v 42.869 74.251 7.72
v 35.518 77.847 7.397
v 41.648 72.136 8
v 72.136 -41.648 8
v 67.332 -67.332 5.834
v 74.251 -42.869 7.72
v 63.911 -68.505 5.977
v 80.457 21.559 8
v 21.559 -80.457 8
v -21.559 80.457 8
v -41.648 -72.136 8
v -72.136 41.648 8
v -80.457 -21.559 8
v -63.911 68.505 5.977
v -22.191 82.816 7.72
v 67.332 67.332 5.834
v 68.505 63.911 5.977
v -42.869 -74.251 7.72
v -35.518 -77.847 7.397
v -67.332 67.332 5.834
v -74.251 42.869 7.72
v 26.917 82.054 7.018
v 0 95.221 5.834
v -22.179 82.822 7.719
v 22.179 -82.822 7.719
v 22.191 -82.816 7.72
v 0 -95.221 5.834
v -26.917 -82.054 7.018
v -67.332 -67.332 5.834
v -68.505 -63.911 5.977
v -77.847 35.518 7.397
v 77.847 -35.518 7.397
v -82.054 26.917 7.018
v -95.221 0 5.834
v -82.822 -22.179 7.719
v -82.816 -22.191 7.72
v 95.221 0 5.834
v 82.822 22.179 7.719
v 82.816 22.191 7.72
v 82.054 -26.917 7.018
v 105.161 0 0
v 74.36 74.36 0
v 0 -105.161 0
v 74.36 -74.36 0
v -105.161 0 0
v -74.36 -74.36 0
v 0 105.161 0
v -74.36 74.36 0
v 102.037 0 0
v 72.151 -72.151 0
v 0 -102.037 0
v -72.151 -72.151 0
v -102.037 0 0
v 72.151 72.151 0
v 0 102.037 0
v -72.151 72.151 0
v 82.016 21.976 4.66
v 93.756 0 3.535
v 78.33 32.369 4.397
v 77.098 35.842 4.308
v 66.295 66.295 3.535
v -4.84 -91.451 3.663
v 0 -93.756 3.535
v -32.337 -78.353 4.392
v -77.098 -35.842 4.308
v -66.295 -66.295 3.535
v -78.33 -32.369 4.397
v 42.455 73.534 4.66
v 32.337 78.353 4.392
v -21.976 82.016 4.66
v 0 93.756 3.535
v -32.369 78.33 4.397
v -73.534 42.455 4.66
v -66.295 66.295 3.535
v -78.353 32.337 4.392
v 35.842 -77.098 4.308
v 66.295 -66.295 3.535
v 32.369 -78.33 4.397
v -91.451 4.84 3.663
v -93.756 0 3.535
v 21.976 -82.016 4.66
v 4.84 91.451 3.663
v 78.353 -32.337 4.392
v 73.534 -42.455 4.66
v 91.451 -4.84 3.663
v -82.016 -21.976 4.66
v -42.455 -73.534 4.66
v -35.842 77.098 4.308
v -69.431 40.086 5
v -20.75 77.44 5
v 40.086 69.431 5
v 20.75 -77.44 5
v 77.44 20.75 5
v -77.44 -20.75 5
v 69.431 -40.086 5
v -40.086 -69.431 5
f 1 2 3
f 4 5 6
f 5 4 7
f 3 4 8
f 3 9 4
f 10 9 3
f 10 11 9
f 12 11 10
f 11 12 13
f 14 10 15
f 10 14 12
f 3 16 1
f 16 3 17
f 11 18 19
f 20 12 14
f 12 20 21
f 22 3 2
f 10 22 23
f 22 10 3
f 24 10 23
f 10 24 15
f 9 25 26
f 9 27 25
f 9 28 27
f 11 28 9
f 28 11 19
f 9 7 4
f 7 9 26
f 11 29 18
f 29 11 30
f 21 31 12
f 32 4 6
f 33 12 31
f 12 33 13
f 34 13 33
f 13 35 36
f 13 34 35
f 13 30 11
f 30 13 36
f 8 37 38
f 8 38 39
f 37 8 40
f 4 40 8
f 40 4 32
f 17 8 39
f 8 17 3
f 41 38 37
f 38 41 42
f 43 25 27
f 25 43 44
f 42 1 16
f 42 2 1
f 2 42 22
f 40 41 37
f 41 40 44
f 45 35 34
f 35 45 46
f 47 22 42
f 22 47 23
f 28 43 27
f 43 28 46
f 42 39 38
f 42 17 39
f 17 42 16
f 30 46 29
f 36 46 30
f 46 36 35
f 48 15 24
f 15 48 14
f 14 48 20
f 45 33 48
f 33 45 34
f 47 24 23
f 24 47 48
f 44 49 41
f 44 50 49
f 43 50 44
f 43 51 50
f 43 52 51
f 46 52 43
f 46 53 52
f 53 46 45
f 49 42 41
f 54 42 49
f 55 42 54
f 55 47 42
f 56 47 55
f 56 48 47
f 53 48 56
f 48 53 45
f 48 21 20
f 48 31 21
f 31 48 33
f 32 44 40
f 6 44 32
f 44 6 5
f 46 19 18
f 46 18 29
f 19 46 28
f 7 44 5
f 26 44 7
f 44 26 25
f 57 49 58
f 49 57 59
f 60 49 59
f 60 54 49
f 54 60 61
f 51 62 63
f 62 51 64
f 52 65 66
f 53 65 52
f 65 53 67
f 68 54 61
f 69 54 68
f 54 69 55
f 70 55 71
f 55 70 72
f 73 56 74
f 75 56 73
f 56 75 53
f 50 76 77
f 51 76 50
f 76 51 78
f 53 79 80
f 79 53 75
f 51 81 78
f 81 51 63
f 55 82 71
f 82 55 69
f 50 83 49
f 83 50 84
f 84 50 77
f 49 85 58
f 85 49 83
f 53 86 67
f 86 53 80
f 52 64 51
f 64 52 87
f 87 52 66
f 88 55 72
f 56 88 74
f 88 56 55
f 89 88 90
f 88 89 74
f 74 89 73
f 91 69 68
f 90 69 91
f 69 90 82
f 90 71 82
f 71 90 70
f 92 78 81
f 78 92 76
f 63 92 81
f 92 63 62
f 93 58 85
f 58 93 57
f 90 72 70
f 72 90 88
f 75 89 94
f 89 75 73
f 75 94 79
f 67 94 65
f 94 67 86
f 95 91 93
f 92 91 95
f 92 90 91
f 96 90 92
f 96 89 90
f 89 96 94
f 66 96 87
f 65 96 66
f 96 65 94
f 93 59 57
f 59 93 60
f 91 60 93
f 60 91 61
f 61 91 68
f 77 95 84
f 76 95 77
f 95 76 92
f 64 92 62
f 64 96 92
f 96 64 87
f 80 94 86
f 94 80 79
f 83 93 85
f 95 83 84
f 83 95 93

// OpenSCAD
//How thick the object is
topThickness=3;//[1:10]
//How large the object will be at the opening, this is the radius of the circle. Due to the way this is calcuated, the less sides the less accurate the object will be. 
objectSide=98;//[5:500]
//How large the closed end of the object is. 
objectTopSide=80;//[5:500]
//How tall the object is
objectHeight=8;//[10:250]
//How many sides there are to the object, the higher the number the more circular the object is. 
fn=8;//[3:100]


module buildIt(){
    fudge = (1+1/cos(180/fn))/2;

    union(){
        difference(){
            cylinder(objectHeight + ( topThickness * 1 ),(objectSide + ( topThickness * 1 ))*fudge,(objectTopSide + ( topThickness * 1 ))*fudge,$fn=fn); //outer triangle
            cylinder(objectHeight ,(objectSide )*fudge,(objectTopSide )*fudge,$fn=fn); //inner triangle
            difference(){
                rotate(a=[0,0,60]) cylinder(objectHeight*3,((objectSide+objectSide)*3 + ( topThickness * 1 ))*fudge,(objectTopSide*3 + ( topThickness * 1 ))*fudge,$fn=fn);
                rotate(a=[0,0,60]) cylinder(objectHeight,(objectSide+(objectSide/2))*fudge,objectTopSide*fudge,$fn=fn);
            } // the cutoffs for the corners
        }
        
        difference(){
            rotate(a=[0,0,60]) cylinder(objectHeight,(objectSide+(objectSide/2)) * fudge,objectTopSide * fudge,$fn=fn);
            rotate(a=[0,0,60]) cylinder(objectHeight-topThickness,(objectSide+(objectSide/2)-topThickness)*fudge,(objectTopSide-topThickness)*fudge,$fn=fn);
            difference(){
                cylinder(objectHeight*8,objectSide*8,objectTopSide*8,$fn=fn); //outer triangle
                cylinder(objectHeight + ( topThickness * 1 ),(objectSide + ( topThickness * 1 )) *fudge,(objectTopSide + ( topThickness * 1 ))*fudge,$fn=fn);
            }

        } // the sides for the triangle and removal of extra portions
    }
}
buildIt();
